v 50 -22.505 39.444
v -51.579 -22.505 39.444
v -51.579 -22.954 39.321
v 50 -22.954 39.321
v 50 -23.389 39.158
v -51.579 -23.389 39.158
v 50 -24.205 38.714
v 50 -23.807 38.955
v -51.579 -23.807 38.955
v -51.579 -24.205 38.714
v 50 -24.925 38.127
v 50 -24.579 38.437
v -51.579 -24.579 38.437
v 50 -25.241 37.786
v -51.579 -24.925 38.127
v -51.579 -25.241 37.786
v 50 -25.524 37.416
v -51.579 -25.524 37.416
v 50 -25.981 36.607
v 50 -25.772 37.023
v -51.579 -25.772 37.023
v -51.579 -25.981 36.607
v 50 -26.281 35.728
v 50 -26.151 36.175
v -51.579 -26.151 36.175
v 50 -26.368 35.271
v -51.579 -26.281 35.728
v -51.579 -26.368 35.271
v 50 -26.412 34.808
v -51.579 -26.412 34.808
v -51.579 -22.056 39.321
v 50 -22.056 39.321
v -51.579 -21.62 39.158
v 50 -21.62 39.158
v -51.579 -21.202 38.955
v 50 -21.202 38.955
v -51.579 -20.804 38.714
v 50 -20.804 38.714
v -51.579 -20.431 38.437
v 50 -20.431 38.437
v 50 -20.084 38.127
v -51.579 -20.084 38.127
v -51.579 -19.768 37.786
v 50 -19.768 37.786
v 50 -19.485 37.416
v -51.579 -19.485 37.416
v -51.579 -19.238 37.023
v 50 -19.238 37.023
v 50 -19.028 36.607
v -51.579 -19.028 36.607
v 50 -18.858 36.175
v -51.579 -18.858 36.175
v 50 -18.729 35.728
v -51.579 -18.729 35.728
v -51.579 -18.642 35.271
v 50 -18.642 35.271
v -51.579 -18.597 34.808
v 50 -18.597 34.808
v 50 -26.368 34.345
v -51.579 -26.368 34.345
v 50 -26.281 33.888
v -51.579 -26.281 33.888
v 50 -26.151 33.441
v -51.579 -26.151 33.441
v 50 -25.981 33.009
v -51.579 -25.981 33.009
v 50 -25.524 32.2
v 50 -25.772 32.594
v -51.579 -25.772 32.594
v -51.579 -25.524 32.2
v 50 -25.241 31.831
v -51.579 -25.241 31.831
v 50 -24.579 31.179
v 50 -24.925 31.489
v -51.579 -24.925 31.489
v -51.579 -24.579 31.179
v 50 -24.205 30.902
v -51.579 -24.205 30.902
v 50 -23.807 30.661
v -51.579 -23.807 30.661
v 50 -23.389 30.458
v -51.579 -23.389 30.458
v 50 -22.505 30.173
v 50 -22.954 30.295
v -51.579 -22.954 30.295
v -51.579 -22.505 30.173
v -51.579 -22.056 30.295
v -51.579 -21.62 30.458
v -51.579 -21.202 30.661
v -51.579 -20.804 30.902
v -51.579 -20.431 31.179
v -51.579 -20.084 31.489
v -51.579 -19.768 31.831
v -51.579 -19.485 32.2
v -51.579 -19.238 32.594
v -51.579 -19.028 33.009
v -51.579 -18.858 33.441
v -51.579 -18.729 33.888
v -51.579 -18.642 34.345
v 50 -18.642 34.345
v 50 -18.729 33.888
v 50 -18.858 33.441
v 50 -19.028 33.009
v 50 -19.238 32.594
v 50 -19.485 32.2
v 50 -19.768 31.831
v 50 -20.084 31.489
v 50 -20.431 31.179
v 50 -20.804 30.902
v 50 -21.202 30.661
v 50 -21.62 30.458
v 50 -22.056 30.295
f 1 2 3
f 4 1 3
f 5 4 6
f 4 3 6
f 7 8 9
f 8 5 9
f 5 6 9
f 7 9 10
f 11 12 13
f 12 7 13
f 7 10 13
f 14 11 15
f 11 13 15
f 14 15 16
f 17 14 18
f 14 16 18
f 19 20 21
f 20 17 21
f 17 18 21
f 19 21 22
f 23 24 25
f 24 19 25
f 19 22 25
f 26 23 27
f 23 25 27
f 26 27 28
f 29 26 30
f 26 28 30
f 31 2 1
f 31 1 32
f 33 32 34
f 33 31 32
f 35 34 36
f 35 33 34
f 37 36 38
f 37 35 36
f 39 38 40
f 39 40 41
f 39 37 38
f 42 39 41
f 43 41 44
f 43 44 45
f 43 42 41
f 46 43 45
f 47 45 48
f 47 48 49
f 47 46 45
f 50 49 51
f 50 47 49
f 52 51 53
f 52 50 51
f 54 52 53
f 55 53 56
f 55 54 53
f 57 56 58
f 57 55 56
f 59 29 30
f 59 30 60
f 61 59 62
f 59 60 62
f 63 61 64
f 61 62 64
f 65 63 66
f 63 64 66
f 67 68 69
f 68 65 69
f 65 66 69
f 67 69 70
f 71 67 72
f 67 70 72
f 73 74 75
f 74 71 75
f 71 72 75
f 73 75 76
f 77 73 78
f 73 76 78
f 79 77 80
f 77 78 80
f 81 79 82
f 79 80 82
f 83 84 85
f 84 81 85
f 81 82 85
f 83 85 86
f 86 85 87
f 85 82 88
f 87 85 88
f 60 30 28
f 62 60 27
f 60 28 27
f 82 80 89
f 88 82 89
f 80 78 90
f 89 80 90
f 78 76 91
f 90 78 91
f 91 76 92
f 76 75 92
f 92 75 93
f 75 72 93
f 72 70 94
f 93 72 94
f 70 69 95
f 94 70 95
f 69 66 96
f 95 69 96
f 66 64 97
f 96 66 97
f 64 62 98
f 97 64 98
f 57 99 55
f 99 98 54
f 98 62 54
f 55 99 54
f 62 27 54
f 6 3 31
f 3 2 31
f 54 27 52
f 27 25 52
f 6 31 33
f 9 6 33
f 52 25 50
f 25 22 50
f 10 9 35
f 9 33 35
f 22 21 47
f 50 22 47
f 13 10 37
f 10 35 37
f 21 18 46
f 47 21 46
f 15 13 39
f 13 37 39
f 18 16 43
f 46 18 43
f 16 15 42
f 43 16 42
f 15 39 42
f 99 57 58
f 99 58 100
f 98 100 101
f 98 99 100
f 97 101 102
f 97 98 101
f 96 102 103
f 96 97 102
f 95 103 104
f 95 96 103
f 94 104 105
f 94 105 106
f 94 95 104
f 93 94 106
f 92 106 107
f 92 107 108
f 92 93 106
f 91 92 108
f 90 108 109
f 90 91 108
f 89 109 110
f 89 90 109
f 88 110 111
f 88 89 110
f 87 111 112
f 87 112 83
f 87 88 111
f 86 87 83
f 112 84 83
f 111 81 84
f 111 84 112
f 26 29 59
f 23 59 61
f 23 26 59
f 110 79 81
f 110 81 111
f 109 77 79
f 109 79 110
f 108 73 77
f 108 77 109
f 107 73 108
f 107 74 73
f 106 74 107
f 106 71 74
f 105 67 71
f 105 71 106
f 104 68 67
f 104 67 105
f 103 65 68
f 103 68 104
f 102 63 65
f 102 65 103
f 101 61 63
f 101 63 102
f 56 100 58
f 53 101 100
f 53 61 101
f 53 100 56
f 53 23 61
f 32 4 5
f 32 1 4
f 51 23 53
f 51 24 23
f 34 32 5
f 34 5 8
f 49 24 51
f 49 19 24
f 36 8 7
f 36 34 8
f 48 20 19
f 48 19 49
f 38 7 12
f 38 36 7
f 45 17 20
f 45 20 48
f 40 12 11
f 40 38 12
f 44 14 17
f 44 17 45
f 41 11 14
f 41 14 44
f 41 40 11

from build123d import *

# Parameters (mm, degrees)
F0_W        = 7.8271683306
F0_H        = 9.5099005848
F2_DEPTH    = 25
F3_DEPTH    = 25
F1_W        = 7.8271683306
F1_H        = 9.5099005848
F4_DEPTH    = 51.5792816877
F3_FACE_W   = 7.8271683306
F3_FACE_H   = 9.5099005848
F4_FACE_W   = 7.8271683306
F4_FACE_H   = 9.5099005848
F6_T1_DEPTH = 126.5792816877


# Not quite as in the source:
# - a fillet or chamfer that OpenCascade refuses, or shapes differently, is made with other operations: its cross-section is extruded or revolved along the edge and cut away or added


with BuildPart() as f2:
    # F0 (on Right) → F2 (new body)
    with BuildSketch(Plane.YZ):
        with Locations((-22.5047236308, 34.8080685362)):
            Rectangle(F0_W, F0_H)
    extrude(amount=F2_DEPTH)

    # F3 (add): a face of the model
    f3_faces = [f2.faces().sort_by_distance(p)[0] for p in [
        (25, -22.5047236308, 34.8080685362),
    ]]
    extrude(f3_faces, amount=F3_DEPTH)

    # F1 (on face) → F4 (join)
    with BuildSketch(Plane.YZ):
        with Locations((-22.5047236308, 34.8080685362)):
            Rectangle(F1_W, F1_H)
    extrude(amount=-F4_DEPTH)

    # F3_face (on face) → F5 section 0
    with BuildSketch(Plane(origin=(50, -22.5047236308, 34.8080685362), x_dir=(0, 1, 0), z_dir=(1, 0, 0))):
        Rectangle(F3_FACE_W, F3_FACE_H)
    # F4_face (on face) → F5 section 1
    with BuildSketch(Plane(origin=(-51.5792816877, -22.5047236308, 34.8080685362), x_dir=(0, 1, 0), z_dir=(-1, 0, 0))):
        Rectangle(F4_FACE_W, F4_FACE_H)
    loft()

    # F6: fillet of radius 5 on 4 edges, made by hand

    # F6_s2 → F6_t1 (cut)
    with BuildSketch(Plane.YZ.offset(-64.0792816877)):
        with BuildLine():
            ThreePointArc((-21.4183077961, 39.5630188286), (-24.9538417021, 38.0985527346), (-26.4183077961, 34.5630188286))
            Line((-26.4183077961, 34.5630188286), (-26.4183077961, 39.5630188286))
            Line((-26.4183077961, 39.5630188286), (-21.4183077961, 39.5630188286))
        make_face()
        with BuildLine():
            ThreePointArc((-23.5911394656, 39.5630188286), (-20.0556055596, 38.0985527346), (-18.5911394656, 34.5630188286))
            Line((-18.5911394656, 34.5630188286), (-18.5911394656, 39.5630188286))
            Line((-18.5911394656, 39.5630188286), (-23.5911394656, 39.5630188286))
        make_face()
        with BuildLine():
            ThreePointArc((-26.4183077961, 35.0531182438), (-24.9538417021, 31.5175843379), (-21.4183077961, 30.0531182438))
            Line((-21.4183077961, 30.0531182438), (-26.4183077961, 30.0531182438))
            Line((-26.4183077961, 30.0531182438), (-26.4183077961, 35.0531182438))
        make_face()
        with BuildLine():
            ThreePointArc((-18.5911394656, 35.0531182438), (-20.0556055596, 31.5175843379), (-23.5911394656, 30.0531182438))
            Line((-23.5911394656, 30.0531182438), (-18.5911394656, 30.0531182438))
            Line((-18.5911394656, 30.0531182438), (-18.5911394656, 35.0531182438))
        make_face()
    extrude(amount=F6_T1_DEPTH, mode=Mode.SUBTRACT)


solid = f2.part
